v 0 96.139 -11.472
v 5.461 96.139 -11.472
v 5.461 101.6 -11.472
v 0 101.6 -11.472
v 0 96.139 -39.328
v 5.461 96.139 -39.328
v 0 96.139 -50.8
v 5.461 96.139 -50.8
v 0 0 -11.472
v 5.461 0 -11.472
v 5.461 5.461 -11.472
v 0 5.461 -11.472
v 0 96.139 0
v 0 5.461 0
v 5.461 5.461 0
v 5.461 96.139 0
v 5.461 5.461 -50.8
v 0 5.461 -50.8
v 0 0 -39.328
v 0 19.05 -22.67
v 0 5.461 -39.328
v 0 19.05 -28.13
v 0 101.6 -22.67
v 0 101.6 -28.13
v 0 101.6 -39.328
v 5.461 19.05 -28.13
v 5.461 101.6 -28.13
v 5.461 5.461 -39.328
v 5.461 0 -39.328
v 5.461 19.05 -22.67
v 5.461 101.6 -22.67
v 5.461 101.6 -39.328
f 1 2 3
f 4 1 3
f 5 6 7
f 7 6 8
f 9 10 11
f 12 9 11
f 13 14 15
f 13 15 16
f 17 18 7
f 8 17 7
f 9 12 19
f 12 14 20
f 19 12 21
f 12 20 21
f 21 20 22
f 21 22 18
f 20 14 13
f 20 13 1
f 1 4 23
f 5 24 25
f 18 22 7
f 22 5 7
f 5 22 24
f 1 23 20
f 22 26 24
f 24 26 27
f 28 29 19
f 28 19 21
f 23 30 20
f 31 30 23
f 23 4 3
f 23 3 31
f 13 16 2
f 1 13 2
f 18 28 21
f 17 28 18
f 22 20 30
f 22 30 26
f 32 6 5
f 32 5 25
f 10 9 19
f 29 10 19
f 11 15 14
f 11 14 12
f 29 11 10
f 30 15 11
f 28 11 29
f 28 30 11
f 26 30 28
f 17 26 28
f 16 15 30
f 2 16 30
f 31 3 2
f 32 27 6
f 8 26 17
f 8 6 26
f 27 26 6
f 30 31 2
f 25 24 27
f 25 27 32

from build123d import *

# Parameters (mm, degrees)
SKETCH1_W           = 50.8
SKETCH1_H           = 101.6
BOSS_EXTRUDE1_DEPTH = 5.461
SKETCH2_W           = 11.472333333
SKETCH2_H           = 5.461
SKETCH2_W_2         = 5.461
SKETCH2_H_2         = 82.55
CUT_EXTRUDE1_DEPTH  = 5.461


with BuildPart() as part:
    # Sketch1 → Boss-Extrude1 (new body)
    with BuildSketch(Plane(origin=(0, 0, 0), x_dir=(0, 0, -1), z_dir=(1, 0, 0))):
        with Locations((25.4, 50.8)):
            Rectangle(SKETCH1_W, SKETCH1_H)
    extrude(amount=BOSS_EXTRUDE1_DEPTH)

    # Sketch2 → Cut-Extrude1 (cut)
    with BuildSketch(Plane(origin=(5.461, 0, 0), x_dir=(0, 0, -1), z_dir=(1, 0, 0))):
        with Locations((45.063833333, 98.8695)):
            Rectangle(SKETCH2_W, SKETCH2_H)
        with Locations((25.4, 60.325)):
            Rectangle(SKETCH2_W_2, SKETCH2_H_2)
        with Locations((5.736166666, 98.8695)):
            Rectangle(SKETCH2_W, SKETCH2_H)
        with Locations((45.063833333, 2.7305)):
            Rectangle(SKETCH2_W, SKETCH2_H)
        with Locations((5.736166666, 2.7305)):
            Rectangle(SKETCH2_W, SKETCH2_H)
    extrude(amount=-CUT_EXTRUDE1_DEPTH, mode=Mode.SUBTRACT)


solid = part.part
